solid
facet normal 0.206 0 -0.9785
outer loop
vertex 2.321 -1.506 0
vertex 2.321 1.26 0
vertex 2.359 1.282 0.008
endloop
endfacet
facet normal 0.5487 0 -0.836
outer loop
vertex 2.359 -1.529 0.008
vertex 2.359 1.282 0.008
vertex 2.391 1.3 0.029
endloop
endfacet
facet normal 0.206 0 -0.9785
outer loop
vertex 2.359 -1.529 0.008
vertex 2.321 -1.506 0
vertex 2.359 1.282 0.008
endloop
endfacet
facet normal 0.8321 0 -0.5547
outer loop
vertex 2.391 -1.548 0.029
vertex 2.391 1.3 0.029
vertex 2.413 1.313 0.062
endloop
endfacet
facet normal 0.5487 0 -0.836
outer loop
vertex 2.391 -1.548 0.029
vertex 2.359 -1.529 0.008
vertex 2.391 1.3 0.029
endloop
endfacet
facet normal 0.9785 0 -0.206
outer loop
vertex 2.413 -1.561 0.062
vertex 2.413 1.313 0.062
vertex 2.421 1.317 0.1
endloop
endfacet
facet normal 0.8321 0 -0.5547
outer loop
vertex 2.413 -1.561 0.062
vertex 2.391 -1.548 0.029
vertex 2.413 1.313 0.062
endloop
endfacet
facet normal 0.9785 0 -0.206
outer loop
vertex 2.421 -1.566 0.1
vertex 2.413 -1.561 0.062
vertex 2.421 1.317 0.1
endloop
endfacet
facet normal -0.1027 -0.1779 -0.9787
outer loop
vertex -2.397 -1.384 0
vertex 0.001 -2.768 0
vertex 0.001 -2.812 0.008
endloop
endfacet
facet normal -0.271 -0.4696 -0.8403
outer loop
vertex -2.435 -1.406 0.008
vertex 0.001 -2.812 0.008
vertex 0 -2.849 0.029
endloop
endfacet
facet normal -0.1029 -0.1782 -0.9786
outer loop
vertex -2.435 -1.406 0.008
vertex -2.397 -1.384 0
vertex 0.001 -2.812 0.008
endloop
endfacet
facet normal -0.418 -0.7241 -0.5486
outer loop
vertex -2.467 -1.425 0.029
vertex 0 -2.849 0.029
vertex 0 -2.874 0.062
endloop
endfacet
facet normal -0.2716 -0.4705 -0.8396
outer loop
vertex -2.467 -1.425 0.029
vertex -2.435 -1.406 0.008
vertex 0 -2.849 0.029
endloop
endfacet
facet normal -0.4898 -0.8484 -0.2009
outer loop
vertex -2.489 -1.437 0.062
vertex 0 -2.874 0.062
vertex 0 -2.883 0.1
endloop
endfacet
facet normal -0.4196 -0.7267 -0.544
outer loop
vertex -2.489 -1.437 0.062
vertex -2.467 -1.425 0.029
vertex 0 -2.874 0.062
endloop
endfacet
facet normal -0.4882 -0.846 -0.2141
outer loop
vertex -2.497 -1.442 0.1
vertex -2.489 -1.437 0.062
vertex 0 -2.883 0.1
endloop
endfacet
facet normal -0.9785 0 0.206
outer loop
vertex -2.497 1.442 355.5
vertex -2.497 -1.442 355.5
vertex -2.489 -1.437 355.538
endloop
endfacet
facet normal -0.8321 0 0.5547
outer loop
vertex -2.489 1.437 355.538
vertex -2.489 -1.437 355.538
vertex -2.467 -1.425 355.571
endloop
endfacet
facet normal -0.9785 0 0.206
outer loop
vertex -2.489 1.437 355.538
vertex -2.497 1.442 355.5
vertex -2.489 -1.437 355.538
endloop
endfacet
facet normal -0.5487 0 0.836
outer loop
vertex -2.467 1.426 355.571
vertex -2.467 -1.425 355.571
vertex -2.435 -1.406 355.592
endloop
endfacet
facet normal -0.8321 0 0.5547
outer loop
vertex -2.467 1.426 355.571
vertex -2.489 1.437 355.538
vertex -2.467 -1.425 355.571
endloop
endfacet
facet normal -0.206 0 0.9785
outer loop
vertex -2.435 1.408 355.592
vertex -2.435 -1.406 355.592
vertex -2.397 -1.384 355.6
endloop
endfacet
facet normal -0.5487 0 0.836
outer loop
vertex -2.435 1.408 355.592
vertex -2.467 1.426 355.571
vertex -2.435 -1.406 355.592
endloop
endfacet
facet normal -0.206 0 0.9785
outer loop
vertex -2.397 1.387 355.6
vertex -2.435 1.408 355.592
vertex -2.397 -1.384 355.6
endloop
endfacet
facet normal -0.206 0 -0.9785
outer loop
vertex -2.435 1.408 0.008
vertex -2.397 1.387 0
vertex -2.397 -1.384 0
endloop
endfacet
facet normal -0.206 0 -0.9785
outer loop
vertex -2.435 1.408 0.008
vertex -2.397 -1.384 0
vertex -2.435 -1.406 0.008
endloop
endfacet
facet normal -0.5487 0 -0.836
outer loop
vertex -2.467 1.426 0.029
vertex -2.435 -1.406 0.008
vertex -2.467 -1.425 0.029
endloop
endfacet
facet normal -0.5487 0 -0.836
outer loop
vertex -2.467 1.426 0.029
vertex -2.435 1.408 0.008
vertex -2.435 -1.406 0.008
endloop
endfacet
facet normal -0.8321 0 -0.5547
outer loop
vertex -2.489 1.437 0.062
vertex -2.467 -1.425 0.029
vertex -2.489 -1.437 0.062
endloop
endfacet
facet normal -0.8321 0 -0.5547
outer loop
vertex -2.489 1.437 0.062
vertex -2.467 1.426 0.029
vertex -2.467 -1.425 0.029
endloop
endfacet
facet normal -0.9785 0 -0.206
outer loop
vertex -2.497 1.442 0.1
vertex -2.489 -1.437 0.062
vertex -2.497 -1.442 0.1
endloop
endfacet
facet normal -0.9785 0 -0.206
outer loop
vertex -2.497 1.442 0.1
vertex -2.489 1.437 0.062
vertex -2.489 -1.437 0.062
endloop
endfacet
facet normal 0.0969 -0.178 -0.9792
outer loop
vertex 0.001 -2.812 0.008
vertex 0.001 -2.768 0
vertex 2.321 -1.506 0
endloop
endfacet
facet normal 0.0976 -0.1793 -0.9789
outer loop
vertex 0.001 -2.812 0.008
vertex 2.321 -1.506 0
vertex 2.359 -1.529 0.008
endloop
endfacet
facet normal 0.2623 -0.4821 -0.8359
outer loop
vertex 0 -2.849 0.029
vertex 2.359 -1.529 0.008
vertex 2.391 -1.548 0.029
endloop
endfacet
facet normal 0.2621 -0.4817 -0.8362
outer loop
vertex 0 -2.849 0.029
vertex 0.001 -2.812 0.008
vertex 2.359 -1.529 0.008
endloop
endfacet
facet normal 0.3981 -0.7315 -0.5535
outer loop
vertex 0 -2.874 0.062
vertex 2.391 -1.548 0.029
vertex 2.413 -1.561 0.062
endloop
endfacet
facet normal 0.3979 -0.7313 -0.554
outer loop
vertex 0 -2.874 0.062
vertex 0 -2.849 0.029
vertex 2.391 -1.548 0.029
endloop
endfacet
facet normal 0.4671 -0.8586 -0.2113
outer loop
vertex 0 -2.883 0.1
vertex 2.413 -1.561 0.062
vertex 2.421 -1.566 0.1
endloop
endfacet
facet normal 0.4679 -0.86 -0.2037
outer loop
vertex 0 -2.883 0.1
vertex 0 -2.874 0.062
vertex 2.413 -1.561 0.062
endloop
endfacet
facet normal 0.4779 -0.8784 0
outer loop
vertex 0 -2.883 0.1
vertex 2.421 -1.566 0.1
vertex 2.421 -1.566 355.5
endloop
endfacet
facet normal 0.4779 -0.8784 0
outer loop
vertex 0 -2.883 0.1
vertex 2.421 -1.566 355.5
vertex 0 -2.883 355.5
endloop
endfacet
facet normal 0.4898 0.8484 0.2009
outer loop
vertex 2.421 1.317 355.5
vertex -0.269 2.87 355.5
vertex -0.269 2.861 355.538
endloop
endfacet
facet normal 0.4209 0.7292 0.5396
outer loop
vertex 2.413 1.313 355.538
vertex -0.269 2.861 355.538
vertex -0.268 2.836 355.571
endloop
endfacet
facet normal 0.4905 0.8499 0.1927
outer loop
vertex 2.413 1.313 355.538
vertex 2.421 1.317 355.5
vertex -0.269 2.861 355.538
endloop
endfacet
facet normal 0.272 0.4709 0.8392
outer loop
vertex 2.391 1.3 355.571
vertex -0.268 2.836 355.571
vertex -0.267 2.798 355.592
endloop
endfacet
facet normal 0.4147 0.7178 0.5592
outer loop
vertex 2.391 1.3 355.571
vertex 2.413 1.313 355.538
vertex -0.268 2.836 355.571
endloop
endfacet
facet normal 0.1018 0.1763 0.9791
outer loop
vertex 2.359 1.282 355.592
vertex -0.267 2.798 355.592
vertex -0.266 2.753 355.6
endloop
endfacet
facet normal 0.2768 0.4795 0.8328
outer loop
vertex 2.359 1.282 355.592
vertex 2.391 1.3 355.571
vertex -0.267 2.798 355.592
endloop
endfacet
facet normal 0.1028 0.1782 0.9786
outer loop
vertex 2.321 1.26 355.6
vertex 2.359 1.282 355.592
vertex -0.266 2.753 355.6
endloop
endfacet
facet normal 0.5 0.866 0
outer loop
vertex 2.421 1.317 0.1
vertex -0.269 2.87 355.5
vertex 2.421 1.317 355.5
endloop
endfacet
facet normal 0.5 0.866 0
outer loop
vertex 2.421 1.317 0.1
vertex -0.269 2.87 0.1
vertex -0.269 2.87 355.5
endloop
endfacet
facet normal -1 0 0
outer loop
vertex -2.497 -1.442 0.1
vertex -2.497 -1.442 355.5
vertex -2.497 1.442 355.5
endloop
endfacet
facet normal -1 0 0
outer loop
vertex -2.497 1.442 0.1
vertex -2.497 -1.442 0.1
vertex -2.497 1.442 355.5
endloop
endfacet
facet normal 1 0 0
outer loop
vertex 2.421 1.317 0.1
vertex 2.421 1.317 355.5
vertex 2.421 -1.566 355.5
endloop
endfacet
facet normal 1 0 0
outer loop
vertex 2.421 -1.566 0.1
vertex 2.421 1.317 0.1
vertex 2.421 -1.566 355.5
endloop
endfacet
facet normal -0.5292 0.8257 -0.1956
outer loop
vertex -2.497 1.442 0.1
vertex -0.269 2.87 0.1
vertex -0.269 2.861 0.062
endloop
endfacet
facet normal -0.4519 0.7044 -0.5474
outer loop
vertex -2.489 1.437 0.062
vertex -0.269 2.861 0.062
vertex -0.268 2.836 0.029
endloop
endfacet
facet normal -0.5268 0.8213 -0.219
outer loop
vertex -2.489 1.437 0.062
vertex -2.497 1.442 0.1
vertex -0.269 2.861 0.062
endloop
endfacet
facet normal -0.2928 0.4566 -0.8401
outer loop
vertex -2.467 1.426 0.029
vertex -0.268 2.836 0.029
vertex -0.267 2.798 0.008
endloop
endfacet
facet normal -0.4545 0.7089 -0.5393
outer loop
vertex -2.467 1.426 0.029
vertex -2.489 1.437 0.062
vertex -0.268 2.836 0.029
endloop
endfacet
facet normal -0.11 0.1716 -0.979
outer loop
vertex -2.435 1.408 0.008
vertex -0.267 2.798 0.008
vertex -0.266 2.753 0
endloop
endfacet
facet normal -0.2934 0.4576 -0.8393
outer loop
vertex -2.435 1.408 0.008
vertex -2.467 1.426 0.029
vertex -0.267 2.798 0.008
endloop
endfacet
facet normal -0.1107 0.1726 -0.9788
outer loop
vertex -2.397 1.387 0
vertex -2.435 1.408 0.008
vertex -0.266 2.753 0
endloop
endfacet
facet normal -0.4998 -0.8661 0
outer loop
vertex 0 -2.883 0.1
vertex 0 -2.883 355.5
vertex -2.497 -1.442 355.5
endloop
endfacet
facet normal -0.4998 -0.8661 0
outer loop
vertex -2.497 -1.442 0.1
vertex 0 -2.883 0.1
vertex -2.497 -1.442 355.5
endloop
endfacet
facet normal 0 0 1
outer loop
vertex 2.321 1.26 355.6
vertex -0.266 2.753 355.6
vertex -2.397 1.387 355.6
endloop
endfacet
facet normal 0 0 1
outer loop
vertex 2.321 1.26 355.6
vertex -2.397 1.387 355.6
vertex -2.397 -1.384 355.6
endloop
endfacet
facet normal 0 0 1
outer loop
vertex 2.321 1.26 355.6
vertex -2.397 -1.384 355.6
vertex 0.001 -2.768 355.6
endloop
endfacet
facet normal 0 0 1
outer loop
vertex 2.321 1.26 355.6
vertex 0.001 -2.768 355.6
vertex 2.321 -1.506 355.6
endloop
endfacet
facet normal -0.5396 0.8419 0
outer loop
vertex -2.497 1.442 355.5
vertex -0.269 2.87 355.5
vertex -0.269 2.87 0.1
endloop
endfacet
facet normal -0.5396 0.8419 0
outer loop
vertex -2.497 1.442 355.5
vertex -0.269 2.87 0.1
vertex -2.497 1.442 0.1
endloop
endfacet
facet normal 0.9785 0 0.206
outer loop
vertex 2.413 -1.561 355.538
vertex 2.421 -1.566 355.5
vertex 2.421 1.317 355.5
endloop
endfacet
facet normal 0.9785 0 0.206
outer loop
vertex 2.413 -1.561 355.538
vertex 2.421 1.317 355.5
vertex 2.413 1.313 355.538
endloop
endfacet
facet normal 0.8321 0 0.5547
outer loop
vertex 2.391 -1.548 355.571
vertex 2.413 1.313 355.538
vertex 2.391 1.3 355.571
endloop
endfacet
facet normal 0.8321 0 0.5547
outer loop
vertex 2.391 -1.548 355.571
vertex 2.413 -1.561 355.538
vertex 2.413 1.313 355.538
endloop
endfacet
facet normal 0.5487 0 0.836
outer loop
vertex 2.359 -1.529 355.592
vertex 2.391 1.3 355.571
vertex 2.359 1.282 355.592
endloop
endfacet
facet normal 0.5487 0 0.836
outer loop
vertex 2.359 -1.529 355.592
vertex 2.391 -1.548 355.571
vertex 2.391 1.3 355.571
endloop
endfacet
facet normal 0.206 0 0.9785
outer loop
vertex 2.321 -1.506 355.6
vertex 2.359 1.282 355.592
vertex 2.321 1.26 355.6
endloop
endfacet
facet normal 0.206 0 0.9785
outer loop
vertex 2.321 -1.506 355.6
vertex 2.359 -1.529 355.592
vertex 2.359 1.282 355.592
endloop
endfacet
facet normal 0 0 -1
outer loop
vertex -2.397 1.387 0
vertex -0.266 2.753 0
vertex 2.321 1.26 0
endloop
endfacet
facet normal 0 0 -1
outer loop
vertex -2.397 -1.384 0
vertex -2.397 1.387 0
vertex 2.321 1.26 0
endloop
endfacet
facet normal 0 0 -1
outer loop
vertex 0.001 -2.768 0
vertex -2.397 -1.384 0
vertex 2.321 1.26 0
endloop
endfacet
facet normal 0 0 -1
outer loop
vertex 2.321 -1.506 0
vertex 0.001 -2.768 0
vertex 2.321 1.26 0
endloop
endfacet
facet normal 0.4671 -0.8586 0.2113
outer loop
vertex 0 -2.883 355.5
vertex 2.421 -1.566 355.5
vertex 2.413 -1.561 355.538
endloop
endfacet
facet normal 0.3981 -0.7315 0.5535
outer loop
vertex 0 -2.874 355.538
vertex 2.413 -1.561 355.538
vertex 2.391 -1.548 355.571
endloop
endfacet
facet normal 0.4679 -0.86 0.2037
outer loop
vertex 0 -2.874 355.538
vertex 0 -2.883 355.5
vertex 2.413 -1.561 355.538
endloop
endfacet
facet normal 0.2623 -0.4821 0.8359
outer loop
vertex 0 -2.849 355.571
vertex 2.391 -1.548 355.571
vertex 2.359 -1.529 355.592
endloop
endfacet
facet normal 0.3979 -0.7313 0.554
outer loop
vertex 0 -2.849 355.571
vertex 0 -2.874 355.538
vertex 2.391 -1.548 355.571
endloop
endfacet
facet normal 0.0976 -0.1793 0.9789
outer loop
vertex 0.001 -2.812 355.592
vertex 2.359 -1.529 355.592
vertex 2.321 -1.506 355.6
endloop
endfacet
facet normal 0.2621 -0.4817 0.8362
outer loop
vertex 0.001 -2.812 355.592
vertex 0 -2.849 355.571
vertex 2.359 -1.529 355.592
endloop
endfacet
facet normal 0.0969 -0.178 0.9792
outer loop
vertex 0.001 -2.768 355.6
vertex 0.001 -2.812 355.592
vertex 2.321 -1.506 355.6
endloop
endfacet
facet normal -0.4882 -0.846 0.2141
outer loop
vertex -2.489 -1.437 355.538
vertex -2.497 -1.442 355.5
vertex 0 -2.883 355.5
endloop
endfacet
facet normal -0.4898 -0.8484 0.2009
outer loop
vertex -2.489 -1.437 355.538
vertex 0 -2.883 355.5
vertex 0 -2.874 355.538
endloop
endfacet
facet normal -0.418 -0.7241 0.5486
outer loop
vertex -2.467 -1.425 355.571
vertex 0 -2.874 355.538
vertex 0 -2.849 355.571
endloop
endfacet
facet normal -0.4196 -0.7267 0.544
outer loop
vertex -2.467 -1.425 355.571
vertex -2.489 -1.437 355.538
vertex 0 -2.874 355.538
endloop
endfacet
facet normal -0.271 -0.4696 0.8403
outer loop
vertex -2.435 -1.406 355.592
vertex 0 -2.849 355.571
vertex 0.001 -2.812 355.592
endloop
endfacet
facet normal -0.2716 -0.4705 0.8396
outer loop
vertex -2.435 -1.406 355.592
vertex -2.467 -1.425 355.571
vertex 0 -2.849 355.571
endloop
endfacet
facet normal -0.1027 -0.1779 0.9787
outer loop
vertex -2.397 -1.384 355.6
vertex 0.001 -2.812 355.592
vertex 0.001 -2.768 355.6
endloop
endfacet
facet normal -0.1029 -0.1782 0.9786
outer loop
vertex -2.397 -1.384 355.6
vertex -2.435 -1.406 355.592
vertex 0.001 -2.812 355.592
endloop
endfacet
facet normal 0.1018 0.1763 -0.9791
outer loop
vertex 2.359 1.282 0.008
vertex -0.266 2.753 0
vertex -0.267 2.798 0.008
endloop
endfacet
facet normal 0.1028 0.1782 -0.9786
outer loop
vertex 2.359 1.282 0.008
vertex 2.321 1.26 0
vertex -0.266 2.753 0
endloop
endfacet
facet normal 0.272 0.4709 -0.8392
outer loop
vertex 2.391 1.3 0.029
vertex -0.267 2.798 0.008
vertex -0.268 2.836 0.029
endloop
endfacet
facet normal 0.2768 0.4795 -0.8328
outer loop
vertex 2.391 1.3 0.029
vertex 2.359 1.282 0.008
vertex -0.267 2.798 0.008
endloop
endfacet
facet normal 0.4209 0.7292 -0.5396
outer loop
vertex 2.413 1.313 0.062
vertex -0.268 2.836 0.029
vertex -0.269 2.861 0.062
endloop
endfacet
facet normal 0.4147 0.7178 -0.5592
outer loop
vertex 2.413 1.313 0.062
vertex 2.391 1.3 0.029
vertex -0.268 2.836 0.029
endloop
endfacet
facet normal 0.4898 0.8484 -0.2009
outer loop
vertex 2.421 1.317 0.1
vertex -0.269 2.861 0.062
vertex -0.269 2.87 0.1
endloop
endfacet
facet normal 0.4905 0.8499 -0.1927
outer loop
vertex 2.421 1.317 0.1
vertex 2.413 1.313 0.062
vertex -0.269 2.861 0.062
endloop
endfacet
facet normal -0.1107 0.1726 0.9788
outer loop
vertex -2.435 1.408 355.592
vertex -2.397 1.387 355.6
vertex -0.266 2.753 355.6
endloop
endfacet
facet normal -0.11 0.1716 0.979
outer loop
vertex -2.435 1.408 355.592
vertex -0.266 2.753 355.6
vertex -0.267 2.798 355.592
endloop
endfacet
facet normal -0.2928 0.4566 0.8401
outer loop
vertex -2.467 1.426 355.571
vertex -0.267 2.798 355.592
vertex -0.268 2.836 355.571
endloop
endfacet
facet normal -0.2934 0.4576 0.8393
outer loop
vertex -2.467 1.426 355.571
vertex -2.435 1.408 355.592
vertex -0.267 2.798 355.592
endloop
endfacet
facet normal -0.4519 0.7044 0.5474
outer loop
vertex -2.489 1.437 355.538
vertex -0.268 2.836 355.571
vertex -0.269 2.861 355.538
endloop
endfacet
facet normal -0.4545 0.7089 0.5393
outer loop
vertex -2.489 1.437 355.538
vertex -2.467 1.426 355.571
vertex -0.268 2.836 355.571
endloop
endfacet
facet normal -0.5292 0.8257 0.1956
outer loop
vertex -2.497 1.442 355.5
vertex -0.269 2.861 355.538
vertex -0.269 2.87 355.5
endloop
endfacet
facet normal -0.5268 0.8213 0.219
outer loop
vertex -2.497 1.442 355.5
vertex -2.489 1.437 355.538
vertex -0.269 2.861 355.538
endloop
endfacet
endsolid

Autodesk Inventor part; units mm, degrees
ref_plane "YZ Plane" through (0, 0, 0) normal (1, 0, 0) x (0, 1, 0)
ref_plane "XZ Plane" through (0, 0, 0) normal (0, 1, 0) x (-1, 0, 0)
ref_plane "XY Plane" through (0, 0, 0) normal (0, 0, 1) x (1, 0, 0)
sketch "Sketch1" plane through (0, 0, 0) normal (0, 0, 1) x (1, 0, 0)
  circle A0 centre (0, 0) radius 2.8829
  line L0 (-0.2691, 2.8703) -> (2.4206, 1.3174)
  line L1 (-0.2691, 2.8703) -> (2.8368, 2.8703) construction
  line L2 (2.4206, 1.3174) -> (2.4206, -1.5658)
  line L3 (2.4206, -1.5658) -> (0, -2.8829)
  line L4 (0, -2.8829) -> (-2.4966, -1.4416)
  line L5 (-2.4966, -1.4416) -> (-2.4966, 1.4416)
  line L6 (-0.2691, 2.8703) -> (-2.4966, 1.4416)
  dimension "d0" = 5.7658
  dimension "d1" = 30
  dimension "d2" = 120
  dimension "d3" = 2.8831
  dimension "d7" = 2.8831
extrude "Extrusion1" add sketch "Sketch1" along normal blind 355.6 contours L0 L2 L3 L4 L5 L6
fillet "Fillet1" radius 0.1 12 edges at (1.0758, 2.0939, 355.6) (-1.3828, 2.1559, 355.6) (-2.4966, 0, 355.6) (-1.2483, -2.1622, 355.6) (1.2103, -2.2243, 355.6) (2.4206, -0.1242, 355.6) (1.0758, 2.0939, 0) (-1.3828, 2.1559, 0) (-2.4966, 0, 0) (-1.2483, -2.1622, 0) (1.2103, -2.2243, 0) (2.4206, -0.1242, 0)
equation "\"d7\" = d3"
properties part number "12 Inch Hex Axle"
